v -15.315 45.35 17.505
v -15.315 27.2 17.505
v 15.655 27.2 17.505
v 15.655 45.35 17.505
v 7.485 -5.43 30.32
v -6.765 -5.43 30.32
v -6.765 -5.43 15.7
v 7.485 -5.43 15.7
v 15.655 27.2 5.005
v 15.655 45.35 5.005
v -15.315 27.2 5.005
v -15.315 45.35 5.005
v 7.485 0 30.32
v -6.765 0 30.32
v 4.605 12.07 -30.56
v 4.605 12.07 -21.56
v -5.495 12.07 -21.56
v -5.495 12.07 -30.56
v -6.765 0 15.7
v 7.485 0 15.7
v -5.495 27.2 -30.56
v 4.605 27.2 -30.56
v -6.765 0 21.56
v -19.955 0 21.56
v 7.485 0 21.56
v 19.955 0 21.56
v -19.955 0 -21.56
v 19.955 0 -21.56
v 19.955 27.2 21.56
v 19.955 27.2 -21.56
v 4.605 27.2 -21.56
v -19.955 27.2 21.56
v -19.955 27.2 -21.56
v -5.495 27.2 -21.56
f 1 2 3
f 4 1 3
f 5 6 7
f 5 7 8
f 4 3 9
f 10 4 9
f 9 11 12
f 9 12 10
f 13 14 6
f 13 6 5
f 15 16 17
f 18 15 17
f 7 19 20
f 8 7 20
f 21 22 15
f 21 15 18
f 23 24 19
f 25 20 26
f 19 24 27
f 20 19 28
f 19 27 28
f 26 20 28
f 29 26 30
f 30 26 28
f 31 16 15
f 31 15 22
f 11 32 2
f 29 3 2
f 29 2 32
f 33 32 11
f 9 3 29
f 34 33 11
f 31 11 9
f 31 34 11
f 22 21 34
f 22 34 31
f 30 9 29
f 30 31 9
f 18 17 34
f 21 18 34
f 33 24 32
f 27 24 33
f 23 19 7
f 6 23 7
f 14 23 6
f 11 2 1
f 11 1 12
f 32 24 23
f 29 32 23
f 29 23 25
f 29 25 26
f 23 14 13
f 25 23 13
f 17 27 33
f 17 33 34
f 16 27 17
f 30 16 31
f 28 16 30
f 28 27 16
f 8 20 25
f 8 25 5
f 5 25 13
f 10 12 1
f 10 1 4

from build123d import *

# Parameters (mm, degrees)
SKETCH1_W           = 39.91
SKETCH1_H           = 43.12
BOSS_EXTRUDE1_DEPTH = 27.2
SKETCH2_W           = 10.1
SKETCH2_H           = 15.13
BOSS_EXTRUDE2_DEPTH = 9
SKETCH5_W           = 14.25
SKETCH5_H           = 14.62
BOSS_EXTRUDE3_DEPTH = 5.43
SKETCH6_W           = 30.97
SKETCH6_H           = 12.5
BOSS_EXTRUDE4_DEPTH = 18.15


with BuildPart() as part:
    # Sketch1 → Boss-Extrude1 (new body)
    with BuildSketch(Plane(origin=(0, 0, 0), x_dir=(1, 0, 0), z_dir=(0, 1, 0))):
        Rectangle(SKETCH1_W, SKETCH1_H)
    extrude(amount=BOSS_EXTRUDE1_DEPTH)

    # Sketch2 → Boss-Extrude2 (add)
    with BuildSketch(Plane(origin=(0, 0, -21.56), x_dir=(-1, 0, 0), z_dir=(0, 0, -1))):
        with Locations((0.445, 19.635)):
            Rectangle(SKETCH2_W, SKETCH2_H)
    extrude(amount=BOSS_EXTRUDE2_DEPTH)

    # Sketch5 → Boss-Extrude3 (add)
    with BuildSketch(Plane.XZ):
        with Locations((0.36, 23.01)):
            Rectangle(SKETCH5_W, SKETCH5_H)
    extrude(amount=BOSS_EXTRUDE3_DEPTH)

    # Sketch6 → Boss-Extrude4 (add)
    with BuildSketch(Plane(origin=(0, 27.2, 0), x_dir=(1, 0, 0), z_dir=(0, 1, 0))):
        with Locations((0.17, -11.254639855)):
            Rectangle(SKETCH6_W, SKETCH6_H)
    extrude(amount=BOSS_EXTRUDE4_DEPTH)


solid = part.part
